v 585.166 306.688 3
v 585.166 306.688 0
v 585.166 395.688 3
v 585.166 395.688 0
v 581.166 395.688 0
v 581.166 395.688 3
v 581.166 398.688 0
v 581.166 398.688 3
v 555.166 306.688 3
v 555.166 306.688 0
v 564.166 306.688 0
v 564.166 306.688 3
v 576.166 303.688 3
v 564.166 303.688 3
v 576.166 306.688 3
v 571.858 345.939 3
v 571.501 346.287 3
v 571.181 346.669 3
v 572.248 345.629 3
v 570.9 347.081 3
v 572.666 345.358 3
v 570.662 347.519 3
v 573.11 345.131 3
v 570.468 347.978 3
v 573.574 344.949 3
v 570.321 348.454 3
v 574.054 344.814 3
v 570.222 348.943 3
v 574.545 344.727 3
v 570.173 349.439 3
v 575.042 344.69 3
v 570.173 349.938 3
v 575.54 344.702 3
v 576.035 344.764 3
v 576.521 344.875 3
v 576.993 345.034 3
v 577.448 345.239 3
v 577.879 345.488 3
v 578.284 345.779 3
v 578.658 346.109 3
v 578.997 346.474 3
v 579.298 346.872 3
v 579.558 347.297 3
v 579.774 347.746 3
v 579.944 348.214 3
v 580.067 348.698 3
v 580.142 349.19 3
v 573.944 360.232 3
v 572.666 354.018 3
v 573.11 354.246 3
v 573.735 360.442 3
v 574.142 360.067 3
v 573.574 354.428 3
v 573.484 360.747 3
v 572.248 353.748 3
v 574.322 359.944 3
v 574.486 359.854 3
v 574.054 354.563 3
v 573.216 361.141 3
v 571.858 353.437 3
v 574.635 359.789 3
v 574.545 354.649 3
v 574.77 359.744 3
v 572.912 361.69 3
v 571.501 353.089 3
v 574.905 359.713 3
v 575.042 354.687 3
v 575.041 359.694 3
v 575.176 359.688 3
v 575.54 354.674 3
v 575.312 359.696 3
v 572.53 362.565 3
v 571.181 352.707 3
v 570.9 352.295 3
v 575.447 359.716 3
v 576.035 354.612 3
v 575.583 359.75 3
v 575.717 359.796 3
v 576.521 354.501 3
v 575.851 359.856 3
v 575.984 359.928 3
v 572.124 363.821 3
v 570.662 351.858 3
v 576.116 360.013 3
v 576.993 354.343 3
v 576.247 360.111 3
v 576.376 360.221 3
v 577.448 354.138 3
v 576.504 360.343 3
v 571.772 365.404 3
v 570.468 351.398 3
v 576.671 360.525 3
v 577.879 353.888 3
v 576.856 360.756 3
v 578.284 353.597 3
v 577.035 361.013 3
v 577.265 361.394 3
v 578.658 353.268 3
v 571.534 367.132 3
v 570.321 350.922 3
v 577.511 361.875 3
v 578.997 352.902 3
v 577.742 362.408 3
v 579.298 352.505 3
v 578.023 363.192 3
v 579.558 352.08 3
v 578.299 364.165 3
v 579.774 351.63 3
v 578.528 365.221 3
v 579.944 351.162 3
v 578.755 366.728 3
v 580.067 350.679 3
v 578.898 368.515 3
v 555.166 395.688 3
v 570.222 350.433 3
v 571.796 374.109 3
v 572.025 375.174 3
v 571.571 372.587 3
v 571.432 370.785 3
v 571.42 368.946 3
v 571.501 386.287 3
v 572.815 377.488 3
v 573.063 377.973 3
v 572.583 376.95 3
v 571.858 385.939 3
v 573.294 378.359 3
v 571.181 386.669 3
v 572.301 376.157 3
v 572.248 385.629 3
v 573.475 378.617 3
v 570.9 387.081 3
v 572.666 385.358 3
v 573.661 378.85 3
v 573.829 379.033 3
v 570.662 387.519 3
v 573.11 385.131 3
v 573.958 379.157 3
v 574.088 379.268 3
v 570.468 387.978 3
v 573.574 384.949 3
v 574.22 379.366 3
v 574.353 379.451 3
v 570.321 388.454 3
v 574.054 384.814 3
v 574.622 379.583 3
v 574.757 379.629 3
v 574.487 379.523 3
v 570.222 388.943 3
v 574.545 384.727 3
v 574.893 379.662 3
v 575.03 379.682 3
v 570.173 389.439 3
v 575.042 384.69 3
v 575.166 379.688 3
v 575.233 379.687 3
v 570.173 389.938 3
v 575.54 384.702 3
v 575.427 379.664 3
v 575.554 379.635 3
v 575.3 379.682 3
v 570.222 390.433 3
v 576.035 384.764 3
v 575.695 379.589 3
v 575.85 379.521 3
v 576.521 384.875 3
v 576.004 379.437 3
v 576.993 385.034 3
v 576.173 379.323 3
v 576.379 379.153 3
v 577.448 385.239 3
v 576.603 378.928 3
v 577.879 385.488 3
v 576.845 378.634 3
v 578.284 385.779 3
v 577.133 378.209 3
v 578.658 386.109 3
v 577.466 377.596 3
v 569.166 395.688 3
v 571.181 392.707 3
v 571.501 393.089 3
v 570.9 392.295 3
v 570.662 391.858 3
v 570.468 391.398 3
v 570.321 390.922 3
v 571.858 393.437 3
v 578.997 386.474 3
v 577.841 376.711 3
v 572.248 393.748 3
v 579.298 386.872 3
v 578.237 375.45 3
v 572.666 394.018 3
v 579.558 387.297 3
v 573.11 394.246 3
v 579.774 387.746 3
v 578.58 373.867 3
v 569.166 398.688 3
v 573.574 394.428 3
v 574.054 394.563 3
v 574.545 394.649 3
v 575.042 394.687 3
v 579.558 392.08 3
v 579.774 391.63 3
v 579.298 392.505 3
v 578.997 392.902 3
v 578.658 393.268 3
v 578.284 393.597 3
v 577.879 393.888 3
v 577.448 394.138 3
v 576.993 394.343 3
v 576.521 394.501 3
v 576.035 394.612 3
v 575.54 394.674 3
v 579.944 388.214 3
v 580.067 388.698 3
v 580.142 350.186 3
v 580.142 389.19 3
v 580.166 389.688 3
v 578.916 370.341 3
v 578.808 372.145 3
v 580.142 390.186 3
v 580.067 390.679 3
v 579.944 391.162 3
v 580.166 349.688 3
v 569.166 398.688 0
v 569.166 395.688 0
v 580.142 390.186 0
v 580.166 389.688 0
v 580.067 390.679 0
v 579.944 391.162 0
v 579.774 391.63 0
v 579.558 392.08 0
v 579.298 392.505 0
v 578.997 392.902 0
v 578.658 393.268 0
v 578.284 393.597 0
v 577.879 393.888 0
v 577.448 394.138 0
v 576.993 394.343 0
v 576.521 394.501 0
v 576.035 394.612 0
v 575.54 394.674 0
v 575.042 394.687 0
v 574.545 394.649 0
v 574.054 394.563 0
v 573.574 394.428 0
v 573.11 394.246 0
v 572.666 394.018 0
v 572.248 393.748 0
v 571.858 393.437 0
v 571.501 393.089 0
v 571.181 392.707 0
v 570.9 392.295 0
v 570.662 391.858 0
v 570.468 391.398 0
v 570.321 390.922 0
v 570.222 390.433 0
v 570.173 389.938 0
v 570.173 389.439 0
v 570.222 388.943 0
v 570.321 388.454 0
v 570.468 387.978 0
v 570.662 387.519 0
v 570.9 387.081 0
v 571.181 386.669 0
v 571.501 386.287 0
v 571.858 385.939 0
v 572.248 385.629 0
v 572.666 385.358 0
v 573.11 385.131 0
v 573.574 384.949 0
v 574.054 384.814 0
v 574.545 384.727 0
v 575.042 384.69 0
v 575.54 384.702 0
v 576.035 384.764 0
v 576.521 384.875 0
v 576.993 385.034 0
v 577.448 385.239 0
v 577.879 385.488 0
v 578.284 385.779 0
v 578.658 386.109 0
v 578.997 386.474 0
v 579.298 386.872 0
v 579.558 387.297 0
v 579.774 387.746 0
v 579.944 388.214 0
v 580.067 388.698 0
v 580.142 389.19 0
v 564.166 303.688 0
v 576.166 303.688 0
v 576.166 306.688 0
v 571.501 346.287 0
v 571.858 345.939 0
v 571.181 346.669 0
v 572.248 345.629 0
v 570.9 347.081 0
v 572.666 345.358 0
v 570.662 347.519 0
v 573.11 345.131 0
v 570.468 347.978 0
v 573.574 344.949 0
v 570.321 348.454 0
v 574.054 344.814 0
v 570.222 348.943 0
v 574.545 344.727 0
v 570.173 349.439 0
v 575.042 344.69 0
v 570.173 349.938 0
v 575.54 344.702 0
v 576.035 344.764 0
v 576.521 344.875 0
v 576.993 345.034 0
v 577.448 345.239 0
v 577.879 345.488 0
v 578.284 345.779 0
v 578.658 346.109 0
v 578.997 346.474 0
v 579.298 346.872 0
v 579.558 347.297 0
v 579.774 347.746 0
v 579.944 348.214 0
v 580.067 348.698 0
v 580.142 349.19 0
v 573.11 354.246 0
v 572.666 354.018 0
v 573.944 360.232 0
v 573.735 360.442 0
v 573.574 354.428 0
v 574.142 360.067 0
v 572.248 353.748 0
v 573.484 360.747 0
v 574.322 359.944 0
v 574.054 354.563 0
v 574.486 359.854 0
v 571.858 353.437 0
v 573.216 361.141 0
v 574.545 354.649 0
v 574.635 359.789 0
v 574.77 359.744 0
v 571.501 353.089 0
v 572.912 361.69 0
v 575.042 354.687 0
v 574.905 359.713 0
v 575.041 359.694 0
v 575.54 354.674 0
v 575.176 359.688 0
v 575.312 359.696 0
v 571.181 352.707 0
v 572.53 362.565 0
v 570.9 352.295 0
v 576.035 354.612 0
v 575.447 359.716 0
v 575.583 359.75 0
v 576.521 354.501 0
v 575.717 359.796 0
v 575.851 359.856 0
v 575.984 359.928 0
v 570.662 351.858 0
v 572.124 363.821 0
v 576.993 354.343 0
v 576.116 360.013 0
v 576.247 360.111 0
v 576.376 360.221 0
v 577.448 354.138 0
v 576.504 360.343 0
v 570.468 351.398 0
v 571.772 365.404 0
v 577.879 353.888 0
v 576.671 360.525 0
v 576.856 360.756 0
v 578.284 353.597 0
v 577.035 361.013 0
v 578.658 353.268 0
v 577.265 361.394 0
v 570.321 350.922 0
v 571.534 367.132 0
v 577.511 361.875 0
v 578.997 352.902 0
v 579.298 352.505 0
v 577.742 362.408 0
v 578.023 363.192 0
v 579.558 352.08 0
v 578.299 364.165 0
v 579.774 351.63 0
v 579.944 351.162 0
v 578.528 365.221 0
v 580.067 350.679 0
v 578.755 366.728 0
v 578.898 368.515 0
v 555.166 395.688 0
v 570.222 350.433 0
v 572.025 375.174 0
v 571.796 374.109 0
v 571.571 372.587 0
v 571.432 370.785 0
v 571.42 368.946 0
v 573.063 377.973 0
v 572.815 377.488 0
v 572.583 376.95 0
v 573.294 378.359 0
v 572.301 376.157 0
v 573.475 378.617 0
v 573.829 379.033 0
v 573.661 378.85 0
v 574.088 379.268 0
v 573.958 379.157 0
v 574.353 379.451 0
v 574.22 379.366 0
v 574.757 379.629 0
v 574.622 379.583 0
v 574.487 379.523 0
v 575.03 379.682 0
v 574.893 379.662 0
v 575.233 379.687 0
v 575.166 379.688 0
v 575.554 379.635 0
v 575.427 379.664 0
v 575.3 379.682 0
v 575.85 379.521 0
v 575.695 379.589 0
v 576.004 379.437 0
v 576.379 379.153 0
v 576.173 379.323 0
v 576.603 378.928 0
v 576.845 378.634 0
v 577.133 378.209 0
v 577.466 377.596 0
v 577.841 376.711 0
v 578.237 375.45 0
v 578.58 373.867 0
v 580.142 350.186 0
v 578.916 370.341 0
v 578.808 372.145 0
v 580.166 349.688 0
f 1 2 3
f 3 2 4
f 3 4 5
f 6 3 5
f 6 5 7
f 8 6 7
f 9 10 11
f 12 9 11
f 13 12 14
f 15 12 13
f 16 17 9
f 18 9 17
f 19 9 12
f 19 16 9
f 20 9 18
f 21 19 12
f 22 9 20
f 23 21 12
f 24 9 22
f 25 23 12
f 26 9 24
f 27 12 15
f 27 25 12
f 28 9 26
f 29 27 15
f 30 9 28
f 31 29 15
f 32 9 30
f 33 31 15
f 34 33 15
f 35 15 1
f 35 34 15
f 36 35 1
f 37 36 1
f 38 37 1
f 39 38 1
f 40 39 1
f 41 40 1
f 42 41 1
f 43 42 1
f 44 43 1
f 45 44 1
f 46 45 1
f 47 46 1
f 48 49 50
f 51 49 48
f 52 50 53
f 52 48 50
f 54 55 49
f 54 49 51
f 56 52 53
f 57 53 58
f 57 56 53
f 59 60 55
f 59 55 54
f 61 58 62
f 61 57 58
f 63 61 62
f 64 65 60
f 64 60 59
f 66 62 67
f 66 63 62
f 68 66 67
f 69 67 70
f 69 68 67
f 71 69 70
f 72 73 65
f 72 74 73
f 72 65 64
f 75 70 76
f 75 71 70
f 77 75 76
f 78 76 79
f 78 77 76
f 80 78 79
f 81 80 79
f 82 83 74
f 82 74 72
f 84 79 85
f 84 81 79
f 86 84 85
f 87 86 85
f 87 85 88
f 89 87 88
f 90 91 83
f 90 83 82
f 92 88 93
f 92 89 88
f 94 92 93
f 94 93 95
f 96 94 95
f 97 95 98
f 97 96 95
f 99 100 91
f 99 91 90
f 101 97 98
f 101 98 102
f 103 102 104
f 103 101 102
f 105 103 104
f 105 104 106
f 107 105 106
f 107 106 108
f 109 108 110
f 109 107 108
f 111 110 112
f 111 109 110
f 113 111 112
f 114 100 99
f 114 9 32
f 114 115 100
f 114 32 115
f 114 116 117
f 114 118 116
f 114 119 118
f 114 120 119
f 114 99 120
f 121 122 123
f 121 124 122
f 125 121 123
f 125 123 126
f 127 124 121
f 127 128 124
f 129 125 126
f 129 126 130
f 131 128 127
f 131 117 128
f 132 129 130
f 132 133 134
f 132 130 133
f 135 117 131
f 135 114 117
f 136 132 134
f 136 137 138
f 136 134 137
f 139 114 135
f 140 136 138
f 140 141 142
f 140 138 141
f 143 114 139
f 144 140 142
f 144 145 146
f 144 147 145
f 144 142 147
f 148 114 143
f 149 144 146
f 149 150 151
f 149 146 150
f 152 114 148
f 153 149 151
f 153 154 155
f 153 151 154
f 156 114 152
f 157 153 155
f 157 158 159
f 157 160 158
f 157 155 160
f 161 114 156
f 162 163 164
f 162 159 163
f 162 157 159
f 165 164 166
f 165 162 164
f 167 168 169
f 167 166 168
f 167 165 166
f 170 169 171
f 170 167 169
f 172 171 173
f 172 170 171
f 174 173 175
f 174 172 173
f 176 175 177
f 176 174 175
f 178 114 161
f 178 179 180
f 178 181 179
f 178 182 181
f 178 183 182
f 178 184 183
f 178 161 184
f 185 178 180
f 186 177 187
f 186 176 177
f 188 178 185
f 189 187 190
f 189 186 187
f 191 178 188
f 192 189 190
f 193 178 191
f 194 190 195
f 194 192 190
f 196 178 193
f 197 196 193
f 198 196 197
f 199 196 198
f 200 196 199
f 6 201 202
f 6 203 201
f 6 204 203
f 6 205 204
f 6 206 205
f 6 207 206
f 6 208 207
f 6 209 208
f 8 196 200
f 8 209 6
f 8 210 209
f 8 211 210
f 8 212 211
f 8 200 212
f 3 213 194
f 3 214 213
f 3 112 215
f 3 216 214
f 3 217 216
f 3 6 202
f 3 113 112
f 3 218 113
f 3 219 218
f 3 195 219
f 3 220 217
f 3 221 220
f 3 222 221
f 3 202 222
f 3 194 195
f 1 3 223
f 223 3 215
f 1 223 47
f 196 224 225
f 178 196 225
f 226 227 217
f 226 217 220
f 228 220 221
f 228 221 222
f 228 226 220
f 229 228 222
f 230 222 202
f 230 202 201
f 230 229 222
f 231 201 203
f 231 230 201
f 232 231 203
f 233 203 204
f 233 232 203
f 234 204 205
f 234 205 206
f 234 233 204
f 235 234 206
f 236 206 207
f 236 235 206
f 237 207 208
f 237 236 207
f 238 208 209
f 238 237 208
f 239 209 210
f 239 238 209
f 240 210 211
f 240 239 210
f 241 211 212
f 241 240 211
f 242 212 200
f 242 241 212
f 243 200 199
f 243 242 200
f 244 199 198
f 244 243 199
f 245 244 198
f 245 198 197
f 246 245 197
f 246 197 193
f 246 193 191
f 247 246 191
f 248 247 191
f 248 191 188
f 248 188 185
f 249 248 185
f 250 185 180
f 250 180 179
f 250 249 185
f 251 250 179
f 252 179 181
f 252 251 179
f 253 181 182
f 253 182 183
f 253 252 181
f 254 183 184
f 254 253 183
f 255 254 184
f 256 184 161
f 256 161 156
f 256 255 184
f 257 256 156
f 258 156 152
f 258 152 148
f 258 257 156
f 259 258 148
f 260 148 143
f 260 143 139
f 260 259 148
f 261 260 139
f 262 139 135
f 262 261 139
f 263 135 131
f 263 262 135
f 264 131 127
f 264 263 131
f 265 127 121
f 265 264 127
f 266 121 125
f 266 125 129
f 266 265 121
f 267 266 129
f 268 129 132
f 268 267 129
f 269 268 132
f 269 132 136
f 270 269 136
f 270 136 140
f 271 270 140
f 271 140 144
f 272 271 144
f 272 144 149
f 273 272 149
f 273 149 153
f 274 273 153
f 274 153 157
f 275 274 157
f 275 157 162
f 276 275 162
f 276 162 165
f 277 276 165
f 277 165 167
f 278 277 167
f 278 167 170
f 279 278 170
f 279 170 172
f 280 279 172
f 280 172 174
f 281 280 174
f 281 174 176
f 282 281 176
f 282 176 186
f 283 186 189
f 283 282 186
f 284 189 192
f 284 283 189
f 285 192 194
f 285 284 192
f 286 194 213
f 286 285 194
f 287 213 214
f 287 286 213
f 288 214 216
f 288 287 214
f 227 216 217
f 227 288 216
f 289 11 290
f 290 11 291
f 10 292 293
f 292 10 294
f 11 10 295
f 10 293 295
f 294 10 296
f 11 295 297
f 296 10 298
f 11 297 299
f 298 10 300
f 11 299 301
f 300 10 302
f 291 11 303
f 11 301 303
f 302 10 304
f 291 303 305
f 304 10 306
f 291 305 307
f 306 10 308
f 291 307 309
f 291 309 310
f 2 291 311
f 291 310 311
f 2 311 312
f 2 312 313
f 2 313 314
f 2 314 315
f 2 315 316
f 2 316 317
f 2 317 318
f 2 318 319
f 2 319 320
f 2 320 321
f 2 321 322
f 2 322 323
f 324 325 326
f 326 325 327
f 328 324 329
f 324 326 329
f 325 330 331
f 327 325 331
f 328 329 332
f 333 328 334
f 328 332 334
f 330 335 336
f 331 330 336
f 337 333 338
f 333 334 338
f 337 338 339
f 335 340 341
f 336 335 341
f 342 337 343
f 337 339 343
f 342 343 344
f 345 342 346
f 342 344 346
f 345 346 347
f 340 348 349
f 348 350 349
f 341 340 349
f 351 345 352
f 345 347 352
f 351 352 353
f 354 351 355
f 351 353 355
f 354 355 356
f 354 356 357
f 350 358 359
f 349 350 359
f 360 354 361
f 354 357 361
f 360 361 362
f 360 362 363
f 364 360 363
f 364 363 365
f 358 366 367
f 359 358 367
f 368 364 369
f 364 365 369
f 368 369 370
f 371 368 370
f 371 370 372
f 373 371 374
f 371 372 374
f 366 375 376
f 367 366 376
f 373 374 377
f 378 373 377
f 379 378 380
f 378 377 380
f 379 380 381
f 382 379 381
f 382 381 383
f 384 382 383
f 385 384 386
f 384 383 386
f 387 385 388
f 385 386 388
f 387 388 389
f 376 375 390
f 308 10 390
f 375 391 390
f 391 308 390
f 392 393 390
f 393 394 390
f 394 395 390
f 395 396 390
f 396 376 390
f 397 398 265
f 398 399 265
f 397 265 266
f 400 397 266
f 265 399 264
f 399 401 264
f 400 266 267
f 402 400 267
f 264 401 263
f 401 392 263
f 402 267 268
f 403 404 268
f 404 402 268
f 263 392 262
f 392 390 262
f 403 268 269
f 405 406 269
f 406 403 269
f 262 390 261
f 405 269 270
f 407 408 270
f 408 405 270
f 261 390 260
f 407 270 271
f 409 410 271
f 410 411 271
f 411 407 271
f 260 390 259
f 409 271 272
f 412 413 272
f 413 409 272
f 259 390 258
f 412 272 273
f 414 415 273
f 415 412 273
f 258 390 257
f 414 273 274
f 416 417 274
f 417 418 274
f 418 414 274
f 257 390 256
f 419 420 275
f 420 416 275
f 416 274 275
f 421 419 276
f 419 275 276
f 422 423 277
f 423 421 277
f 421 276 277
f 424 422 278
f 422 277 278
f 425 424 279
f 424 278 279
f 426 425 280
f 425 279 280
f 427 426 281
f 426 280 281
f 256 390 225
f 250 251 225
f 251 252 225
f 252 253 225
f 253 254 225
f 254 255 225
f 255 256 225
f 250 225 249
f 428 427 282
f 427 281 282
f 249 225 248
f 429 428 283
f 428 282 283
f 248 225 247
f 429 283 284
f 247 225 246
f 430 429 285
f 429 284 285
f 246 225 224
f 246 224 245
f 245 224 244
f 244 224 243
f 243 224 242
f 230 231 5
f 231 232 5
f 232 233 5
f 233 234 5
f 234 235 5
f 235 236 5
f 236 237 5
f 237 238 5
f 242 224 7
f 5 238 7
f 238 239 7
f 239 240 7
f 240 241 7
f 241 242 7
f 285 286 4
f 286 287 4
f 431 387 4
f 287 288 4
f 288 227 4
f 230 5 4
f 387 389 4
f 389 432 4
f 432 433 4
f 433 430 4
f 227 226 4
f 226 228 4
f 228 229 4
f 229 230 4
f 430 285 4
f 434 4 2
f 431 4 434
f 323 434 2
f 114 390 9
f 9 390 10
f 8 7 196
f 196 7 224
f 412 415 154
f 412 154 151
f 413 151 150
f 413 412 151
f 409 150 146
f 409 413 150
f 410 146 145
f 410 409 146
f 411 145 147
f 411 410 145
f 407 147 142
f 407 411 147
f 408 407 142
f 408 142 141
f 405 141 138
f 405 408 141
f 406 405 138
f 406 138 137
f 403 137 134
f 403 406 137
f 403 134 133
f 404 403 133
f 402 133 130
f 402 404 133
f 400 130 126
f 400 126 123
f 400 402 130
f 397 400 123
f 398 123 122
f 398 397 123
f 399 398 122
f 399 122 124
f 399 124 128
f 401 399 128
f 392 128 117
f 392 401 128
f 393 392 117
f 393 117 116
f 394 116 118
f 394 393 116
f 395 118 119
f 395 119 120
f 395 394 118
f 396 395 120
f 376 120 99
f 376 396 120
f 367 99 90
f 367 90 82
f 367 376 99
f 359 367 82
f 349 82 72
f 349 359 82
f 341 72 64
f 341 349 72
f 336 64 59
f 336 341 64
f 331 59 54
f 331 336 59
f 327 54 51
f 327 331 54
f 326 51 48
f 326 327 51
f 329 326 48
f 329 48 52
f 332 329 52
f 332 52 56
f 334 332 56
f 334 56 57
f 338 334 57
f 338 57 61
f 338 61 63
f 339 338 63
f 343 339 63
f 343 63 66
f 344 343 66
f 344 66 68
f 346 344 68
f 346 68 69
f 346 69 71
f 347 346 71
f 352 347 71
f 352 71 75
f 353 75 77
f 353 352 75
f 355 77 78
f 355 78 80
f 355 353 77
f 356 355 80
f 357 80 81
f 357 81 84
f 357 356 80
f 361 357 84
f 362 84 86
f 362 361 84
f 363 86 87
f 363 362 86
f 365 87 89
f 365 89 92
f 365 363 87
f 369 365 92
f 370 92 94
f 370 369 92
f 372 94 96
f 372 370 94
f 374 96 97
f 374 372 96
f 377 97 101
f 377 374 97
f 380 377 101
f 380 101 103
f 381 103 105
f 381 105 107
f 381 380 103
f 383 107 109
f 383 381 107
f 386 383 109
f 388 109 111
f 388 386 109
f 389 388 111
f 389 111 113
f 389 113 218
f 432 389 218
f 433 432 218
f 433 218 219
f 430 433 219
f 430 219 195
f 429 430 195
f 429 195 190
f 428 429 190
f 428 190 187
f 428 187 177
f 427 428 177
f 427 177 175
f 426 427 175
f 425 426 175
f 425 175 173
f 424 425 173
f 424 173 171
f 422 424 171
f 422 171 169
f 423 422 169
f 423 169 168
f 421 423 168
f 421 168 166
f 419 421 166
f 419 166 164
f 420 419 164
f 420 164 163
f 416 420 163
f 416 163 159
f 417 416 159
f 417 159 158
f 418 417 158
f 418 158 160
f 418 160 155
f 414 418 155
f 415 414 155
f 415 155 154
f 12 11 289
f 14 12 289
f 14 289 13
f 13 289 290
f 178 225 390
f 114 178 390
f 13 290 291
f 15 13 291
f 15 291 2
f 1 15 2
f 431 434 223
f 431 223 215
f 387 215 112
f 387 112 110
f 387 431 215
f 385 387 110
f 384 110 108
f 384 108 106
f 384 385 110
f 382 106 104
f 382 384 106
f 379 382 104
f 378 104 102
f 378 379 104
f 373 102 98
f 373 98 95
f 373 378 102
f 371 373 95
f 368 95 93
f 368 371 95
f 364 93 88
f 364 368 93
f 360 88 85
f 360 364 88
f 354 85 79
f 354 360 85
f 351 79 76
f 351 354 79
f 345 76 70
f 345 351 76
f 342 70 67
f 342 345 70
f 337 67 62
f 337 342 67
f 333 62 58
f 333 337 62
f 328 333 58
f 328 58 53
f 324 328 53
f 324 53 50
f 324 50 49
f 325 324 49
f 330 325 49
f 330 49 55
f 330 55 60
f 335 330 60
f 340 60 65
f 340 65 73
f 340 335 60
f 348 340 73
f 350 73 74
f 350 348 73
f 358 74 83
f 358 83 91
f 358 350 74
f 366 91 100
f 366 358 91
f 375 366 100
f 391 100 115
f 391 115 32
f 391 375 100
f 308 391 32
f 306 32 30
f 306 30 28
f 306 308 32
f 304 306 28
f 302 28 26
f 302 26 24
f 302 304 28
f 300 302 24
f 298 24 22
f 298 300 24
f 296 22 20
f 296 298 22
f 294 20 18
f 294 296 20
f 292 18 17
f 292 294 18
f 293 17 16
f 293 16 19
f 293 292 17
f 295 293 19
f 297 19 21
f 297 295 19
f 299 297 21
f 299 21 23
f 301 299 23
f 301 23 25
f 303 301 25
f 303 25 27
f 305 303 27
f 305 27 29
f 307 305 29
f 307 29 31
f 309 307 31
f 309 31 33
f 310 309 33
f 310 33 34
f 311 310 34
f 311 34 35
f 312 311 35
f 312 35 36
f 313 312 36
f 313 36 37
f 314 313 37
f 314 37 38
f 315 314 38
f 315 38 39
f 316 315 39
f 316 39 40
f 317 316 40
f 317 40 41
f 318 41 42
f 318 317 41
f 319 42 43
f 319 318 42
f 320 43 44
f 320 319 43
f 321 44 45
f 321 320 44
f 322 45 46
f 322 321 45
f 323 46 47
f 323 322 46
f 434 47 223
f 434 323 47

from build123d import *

# Parameters (mm, degrees)
SKETCH_1_R      = 5
SKETCH_1_RX     = 10
SKETCH_1_RY     = 3.757052079
EXTRUDE_1_DEPTH = 3


with BuildPart() as part:
    # 草图1 → 凸台-拉伸1 (new body)
    with BuildSketch(Plane.XY):
        Polygon((555.166453787, 395.688275275), (555.166453787, 306.688275275), (564.166453787, 306.688275275), (564.166453787, 303.688275275), (576.166453787, 303.688275275), (576.166453787, 306.688275275), (585.166453787, 306.688275275), (585.166453787, 395.688275275), (581.166453787, 395.688275275), (581.166453787, 398.688275275), (569.166453787, 398.688275275), (569.166453787, 395.688275275), align=None)
        with Locations((575.166453787, 389.688275275)):
            Circle(SKETCH_1_R, mode=Mode.SUBTRACT)
        with Locations((575.166453787, 349.688275275)):
            Circle(SKETCH_1_R, mode=Mode.SUBTRACT)
        with Locations(Location((575.166453787, 369.688275275), (0, 0, 90))):
            Ellipse(SKETCH_1_RX, SKETCH_1_RY, mode=Mode.SUBTRACT)
    extrude(amount=EXTRUDE_1_DEPTH)


solid = part.part
